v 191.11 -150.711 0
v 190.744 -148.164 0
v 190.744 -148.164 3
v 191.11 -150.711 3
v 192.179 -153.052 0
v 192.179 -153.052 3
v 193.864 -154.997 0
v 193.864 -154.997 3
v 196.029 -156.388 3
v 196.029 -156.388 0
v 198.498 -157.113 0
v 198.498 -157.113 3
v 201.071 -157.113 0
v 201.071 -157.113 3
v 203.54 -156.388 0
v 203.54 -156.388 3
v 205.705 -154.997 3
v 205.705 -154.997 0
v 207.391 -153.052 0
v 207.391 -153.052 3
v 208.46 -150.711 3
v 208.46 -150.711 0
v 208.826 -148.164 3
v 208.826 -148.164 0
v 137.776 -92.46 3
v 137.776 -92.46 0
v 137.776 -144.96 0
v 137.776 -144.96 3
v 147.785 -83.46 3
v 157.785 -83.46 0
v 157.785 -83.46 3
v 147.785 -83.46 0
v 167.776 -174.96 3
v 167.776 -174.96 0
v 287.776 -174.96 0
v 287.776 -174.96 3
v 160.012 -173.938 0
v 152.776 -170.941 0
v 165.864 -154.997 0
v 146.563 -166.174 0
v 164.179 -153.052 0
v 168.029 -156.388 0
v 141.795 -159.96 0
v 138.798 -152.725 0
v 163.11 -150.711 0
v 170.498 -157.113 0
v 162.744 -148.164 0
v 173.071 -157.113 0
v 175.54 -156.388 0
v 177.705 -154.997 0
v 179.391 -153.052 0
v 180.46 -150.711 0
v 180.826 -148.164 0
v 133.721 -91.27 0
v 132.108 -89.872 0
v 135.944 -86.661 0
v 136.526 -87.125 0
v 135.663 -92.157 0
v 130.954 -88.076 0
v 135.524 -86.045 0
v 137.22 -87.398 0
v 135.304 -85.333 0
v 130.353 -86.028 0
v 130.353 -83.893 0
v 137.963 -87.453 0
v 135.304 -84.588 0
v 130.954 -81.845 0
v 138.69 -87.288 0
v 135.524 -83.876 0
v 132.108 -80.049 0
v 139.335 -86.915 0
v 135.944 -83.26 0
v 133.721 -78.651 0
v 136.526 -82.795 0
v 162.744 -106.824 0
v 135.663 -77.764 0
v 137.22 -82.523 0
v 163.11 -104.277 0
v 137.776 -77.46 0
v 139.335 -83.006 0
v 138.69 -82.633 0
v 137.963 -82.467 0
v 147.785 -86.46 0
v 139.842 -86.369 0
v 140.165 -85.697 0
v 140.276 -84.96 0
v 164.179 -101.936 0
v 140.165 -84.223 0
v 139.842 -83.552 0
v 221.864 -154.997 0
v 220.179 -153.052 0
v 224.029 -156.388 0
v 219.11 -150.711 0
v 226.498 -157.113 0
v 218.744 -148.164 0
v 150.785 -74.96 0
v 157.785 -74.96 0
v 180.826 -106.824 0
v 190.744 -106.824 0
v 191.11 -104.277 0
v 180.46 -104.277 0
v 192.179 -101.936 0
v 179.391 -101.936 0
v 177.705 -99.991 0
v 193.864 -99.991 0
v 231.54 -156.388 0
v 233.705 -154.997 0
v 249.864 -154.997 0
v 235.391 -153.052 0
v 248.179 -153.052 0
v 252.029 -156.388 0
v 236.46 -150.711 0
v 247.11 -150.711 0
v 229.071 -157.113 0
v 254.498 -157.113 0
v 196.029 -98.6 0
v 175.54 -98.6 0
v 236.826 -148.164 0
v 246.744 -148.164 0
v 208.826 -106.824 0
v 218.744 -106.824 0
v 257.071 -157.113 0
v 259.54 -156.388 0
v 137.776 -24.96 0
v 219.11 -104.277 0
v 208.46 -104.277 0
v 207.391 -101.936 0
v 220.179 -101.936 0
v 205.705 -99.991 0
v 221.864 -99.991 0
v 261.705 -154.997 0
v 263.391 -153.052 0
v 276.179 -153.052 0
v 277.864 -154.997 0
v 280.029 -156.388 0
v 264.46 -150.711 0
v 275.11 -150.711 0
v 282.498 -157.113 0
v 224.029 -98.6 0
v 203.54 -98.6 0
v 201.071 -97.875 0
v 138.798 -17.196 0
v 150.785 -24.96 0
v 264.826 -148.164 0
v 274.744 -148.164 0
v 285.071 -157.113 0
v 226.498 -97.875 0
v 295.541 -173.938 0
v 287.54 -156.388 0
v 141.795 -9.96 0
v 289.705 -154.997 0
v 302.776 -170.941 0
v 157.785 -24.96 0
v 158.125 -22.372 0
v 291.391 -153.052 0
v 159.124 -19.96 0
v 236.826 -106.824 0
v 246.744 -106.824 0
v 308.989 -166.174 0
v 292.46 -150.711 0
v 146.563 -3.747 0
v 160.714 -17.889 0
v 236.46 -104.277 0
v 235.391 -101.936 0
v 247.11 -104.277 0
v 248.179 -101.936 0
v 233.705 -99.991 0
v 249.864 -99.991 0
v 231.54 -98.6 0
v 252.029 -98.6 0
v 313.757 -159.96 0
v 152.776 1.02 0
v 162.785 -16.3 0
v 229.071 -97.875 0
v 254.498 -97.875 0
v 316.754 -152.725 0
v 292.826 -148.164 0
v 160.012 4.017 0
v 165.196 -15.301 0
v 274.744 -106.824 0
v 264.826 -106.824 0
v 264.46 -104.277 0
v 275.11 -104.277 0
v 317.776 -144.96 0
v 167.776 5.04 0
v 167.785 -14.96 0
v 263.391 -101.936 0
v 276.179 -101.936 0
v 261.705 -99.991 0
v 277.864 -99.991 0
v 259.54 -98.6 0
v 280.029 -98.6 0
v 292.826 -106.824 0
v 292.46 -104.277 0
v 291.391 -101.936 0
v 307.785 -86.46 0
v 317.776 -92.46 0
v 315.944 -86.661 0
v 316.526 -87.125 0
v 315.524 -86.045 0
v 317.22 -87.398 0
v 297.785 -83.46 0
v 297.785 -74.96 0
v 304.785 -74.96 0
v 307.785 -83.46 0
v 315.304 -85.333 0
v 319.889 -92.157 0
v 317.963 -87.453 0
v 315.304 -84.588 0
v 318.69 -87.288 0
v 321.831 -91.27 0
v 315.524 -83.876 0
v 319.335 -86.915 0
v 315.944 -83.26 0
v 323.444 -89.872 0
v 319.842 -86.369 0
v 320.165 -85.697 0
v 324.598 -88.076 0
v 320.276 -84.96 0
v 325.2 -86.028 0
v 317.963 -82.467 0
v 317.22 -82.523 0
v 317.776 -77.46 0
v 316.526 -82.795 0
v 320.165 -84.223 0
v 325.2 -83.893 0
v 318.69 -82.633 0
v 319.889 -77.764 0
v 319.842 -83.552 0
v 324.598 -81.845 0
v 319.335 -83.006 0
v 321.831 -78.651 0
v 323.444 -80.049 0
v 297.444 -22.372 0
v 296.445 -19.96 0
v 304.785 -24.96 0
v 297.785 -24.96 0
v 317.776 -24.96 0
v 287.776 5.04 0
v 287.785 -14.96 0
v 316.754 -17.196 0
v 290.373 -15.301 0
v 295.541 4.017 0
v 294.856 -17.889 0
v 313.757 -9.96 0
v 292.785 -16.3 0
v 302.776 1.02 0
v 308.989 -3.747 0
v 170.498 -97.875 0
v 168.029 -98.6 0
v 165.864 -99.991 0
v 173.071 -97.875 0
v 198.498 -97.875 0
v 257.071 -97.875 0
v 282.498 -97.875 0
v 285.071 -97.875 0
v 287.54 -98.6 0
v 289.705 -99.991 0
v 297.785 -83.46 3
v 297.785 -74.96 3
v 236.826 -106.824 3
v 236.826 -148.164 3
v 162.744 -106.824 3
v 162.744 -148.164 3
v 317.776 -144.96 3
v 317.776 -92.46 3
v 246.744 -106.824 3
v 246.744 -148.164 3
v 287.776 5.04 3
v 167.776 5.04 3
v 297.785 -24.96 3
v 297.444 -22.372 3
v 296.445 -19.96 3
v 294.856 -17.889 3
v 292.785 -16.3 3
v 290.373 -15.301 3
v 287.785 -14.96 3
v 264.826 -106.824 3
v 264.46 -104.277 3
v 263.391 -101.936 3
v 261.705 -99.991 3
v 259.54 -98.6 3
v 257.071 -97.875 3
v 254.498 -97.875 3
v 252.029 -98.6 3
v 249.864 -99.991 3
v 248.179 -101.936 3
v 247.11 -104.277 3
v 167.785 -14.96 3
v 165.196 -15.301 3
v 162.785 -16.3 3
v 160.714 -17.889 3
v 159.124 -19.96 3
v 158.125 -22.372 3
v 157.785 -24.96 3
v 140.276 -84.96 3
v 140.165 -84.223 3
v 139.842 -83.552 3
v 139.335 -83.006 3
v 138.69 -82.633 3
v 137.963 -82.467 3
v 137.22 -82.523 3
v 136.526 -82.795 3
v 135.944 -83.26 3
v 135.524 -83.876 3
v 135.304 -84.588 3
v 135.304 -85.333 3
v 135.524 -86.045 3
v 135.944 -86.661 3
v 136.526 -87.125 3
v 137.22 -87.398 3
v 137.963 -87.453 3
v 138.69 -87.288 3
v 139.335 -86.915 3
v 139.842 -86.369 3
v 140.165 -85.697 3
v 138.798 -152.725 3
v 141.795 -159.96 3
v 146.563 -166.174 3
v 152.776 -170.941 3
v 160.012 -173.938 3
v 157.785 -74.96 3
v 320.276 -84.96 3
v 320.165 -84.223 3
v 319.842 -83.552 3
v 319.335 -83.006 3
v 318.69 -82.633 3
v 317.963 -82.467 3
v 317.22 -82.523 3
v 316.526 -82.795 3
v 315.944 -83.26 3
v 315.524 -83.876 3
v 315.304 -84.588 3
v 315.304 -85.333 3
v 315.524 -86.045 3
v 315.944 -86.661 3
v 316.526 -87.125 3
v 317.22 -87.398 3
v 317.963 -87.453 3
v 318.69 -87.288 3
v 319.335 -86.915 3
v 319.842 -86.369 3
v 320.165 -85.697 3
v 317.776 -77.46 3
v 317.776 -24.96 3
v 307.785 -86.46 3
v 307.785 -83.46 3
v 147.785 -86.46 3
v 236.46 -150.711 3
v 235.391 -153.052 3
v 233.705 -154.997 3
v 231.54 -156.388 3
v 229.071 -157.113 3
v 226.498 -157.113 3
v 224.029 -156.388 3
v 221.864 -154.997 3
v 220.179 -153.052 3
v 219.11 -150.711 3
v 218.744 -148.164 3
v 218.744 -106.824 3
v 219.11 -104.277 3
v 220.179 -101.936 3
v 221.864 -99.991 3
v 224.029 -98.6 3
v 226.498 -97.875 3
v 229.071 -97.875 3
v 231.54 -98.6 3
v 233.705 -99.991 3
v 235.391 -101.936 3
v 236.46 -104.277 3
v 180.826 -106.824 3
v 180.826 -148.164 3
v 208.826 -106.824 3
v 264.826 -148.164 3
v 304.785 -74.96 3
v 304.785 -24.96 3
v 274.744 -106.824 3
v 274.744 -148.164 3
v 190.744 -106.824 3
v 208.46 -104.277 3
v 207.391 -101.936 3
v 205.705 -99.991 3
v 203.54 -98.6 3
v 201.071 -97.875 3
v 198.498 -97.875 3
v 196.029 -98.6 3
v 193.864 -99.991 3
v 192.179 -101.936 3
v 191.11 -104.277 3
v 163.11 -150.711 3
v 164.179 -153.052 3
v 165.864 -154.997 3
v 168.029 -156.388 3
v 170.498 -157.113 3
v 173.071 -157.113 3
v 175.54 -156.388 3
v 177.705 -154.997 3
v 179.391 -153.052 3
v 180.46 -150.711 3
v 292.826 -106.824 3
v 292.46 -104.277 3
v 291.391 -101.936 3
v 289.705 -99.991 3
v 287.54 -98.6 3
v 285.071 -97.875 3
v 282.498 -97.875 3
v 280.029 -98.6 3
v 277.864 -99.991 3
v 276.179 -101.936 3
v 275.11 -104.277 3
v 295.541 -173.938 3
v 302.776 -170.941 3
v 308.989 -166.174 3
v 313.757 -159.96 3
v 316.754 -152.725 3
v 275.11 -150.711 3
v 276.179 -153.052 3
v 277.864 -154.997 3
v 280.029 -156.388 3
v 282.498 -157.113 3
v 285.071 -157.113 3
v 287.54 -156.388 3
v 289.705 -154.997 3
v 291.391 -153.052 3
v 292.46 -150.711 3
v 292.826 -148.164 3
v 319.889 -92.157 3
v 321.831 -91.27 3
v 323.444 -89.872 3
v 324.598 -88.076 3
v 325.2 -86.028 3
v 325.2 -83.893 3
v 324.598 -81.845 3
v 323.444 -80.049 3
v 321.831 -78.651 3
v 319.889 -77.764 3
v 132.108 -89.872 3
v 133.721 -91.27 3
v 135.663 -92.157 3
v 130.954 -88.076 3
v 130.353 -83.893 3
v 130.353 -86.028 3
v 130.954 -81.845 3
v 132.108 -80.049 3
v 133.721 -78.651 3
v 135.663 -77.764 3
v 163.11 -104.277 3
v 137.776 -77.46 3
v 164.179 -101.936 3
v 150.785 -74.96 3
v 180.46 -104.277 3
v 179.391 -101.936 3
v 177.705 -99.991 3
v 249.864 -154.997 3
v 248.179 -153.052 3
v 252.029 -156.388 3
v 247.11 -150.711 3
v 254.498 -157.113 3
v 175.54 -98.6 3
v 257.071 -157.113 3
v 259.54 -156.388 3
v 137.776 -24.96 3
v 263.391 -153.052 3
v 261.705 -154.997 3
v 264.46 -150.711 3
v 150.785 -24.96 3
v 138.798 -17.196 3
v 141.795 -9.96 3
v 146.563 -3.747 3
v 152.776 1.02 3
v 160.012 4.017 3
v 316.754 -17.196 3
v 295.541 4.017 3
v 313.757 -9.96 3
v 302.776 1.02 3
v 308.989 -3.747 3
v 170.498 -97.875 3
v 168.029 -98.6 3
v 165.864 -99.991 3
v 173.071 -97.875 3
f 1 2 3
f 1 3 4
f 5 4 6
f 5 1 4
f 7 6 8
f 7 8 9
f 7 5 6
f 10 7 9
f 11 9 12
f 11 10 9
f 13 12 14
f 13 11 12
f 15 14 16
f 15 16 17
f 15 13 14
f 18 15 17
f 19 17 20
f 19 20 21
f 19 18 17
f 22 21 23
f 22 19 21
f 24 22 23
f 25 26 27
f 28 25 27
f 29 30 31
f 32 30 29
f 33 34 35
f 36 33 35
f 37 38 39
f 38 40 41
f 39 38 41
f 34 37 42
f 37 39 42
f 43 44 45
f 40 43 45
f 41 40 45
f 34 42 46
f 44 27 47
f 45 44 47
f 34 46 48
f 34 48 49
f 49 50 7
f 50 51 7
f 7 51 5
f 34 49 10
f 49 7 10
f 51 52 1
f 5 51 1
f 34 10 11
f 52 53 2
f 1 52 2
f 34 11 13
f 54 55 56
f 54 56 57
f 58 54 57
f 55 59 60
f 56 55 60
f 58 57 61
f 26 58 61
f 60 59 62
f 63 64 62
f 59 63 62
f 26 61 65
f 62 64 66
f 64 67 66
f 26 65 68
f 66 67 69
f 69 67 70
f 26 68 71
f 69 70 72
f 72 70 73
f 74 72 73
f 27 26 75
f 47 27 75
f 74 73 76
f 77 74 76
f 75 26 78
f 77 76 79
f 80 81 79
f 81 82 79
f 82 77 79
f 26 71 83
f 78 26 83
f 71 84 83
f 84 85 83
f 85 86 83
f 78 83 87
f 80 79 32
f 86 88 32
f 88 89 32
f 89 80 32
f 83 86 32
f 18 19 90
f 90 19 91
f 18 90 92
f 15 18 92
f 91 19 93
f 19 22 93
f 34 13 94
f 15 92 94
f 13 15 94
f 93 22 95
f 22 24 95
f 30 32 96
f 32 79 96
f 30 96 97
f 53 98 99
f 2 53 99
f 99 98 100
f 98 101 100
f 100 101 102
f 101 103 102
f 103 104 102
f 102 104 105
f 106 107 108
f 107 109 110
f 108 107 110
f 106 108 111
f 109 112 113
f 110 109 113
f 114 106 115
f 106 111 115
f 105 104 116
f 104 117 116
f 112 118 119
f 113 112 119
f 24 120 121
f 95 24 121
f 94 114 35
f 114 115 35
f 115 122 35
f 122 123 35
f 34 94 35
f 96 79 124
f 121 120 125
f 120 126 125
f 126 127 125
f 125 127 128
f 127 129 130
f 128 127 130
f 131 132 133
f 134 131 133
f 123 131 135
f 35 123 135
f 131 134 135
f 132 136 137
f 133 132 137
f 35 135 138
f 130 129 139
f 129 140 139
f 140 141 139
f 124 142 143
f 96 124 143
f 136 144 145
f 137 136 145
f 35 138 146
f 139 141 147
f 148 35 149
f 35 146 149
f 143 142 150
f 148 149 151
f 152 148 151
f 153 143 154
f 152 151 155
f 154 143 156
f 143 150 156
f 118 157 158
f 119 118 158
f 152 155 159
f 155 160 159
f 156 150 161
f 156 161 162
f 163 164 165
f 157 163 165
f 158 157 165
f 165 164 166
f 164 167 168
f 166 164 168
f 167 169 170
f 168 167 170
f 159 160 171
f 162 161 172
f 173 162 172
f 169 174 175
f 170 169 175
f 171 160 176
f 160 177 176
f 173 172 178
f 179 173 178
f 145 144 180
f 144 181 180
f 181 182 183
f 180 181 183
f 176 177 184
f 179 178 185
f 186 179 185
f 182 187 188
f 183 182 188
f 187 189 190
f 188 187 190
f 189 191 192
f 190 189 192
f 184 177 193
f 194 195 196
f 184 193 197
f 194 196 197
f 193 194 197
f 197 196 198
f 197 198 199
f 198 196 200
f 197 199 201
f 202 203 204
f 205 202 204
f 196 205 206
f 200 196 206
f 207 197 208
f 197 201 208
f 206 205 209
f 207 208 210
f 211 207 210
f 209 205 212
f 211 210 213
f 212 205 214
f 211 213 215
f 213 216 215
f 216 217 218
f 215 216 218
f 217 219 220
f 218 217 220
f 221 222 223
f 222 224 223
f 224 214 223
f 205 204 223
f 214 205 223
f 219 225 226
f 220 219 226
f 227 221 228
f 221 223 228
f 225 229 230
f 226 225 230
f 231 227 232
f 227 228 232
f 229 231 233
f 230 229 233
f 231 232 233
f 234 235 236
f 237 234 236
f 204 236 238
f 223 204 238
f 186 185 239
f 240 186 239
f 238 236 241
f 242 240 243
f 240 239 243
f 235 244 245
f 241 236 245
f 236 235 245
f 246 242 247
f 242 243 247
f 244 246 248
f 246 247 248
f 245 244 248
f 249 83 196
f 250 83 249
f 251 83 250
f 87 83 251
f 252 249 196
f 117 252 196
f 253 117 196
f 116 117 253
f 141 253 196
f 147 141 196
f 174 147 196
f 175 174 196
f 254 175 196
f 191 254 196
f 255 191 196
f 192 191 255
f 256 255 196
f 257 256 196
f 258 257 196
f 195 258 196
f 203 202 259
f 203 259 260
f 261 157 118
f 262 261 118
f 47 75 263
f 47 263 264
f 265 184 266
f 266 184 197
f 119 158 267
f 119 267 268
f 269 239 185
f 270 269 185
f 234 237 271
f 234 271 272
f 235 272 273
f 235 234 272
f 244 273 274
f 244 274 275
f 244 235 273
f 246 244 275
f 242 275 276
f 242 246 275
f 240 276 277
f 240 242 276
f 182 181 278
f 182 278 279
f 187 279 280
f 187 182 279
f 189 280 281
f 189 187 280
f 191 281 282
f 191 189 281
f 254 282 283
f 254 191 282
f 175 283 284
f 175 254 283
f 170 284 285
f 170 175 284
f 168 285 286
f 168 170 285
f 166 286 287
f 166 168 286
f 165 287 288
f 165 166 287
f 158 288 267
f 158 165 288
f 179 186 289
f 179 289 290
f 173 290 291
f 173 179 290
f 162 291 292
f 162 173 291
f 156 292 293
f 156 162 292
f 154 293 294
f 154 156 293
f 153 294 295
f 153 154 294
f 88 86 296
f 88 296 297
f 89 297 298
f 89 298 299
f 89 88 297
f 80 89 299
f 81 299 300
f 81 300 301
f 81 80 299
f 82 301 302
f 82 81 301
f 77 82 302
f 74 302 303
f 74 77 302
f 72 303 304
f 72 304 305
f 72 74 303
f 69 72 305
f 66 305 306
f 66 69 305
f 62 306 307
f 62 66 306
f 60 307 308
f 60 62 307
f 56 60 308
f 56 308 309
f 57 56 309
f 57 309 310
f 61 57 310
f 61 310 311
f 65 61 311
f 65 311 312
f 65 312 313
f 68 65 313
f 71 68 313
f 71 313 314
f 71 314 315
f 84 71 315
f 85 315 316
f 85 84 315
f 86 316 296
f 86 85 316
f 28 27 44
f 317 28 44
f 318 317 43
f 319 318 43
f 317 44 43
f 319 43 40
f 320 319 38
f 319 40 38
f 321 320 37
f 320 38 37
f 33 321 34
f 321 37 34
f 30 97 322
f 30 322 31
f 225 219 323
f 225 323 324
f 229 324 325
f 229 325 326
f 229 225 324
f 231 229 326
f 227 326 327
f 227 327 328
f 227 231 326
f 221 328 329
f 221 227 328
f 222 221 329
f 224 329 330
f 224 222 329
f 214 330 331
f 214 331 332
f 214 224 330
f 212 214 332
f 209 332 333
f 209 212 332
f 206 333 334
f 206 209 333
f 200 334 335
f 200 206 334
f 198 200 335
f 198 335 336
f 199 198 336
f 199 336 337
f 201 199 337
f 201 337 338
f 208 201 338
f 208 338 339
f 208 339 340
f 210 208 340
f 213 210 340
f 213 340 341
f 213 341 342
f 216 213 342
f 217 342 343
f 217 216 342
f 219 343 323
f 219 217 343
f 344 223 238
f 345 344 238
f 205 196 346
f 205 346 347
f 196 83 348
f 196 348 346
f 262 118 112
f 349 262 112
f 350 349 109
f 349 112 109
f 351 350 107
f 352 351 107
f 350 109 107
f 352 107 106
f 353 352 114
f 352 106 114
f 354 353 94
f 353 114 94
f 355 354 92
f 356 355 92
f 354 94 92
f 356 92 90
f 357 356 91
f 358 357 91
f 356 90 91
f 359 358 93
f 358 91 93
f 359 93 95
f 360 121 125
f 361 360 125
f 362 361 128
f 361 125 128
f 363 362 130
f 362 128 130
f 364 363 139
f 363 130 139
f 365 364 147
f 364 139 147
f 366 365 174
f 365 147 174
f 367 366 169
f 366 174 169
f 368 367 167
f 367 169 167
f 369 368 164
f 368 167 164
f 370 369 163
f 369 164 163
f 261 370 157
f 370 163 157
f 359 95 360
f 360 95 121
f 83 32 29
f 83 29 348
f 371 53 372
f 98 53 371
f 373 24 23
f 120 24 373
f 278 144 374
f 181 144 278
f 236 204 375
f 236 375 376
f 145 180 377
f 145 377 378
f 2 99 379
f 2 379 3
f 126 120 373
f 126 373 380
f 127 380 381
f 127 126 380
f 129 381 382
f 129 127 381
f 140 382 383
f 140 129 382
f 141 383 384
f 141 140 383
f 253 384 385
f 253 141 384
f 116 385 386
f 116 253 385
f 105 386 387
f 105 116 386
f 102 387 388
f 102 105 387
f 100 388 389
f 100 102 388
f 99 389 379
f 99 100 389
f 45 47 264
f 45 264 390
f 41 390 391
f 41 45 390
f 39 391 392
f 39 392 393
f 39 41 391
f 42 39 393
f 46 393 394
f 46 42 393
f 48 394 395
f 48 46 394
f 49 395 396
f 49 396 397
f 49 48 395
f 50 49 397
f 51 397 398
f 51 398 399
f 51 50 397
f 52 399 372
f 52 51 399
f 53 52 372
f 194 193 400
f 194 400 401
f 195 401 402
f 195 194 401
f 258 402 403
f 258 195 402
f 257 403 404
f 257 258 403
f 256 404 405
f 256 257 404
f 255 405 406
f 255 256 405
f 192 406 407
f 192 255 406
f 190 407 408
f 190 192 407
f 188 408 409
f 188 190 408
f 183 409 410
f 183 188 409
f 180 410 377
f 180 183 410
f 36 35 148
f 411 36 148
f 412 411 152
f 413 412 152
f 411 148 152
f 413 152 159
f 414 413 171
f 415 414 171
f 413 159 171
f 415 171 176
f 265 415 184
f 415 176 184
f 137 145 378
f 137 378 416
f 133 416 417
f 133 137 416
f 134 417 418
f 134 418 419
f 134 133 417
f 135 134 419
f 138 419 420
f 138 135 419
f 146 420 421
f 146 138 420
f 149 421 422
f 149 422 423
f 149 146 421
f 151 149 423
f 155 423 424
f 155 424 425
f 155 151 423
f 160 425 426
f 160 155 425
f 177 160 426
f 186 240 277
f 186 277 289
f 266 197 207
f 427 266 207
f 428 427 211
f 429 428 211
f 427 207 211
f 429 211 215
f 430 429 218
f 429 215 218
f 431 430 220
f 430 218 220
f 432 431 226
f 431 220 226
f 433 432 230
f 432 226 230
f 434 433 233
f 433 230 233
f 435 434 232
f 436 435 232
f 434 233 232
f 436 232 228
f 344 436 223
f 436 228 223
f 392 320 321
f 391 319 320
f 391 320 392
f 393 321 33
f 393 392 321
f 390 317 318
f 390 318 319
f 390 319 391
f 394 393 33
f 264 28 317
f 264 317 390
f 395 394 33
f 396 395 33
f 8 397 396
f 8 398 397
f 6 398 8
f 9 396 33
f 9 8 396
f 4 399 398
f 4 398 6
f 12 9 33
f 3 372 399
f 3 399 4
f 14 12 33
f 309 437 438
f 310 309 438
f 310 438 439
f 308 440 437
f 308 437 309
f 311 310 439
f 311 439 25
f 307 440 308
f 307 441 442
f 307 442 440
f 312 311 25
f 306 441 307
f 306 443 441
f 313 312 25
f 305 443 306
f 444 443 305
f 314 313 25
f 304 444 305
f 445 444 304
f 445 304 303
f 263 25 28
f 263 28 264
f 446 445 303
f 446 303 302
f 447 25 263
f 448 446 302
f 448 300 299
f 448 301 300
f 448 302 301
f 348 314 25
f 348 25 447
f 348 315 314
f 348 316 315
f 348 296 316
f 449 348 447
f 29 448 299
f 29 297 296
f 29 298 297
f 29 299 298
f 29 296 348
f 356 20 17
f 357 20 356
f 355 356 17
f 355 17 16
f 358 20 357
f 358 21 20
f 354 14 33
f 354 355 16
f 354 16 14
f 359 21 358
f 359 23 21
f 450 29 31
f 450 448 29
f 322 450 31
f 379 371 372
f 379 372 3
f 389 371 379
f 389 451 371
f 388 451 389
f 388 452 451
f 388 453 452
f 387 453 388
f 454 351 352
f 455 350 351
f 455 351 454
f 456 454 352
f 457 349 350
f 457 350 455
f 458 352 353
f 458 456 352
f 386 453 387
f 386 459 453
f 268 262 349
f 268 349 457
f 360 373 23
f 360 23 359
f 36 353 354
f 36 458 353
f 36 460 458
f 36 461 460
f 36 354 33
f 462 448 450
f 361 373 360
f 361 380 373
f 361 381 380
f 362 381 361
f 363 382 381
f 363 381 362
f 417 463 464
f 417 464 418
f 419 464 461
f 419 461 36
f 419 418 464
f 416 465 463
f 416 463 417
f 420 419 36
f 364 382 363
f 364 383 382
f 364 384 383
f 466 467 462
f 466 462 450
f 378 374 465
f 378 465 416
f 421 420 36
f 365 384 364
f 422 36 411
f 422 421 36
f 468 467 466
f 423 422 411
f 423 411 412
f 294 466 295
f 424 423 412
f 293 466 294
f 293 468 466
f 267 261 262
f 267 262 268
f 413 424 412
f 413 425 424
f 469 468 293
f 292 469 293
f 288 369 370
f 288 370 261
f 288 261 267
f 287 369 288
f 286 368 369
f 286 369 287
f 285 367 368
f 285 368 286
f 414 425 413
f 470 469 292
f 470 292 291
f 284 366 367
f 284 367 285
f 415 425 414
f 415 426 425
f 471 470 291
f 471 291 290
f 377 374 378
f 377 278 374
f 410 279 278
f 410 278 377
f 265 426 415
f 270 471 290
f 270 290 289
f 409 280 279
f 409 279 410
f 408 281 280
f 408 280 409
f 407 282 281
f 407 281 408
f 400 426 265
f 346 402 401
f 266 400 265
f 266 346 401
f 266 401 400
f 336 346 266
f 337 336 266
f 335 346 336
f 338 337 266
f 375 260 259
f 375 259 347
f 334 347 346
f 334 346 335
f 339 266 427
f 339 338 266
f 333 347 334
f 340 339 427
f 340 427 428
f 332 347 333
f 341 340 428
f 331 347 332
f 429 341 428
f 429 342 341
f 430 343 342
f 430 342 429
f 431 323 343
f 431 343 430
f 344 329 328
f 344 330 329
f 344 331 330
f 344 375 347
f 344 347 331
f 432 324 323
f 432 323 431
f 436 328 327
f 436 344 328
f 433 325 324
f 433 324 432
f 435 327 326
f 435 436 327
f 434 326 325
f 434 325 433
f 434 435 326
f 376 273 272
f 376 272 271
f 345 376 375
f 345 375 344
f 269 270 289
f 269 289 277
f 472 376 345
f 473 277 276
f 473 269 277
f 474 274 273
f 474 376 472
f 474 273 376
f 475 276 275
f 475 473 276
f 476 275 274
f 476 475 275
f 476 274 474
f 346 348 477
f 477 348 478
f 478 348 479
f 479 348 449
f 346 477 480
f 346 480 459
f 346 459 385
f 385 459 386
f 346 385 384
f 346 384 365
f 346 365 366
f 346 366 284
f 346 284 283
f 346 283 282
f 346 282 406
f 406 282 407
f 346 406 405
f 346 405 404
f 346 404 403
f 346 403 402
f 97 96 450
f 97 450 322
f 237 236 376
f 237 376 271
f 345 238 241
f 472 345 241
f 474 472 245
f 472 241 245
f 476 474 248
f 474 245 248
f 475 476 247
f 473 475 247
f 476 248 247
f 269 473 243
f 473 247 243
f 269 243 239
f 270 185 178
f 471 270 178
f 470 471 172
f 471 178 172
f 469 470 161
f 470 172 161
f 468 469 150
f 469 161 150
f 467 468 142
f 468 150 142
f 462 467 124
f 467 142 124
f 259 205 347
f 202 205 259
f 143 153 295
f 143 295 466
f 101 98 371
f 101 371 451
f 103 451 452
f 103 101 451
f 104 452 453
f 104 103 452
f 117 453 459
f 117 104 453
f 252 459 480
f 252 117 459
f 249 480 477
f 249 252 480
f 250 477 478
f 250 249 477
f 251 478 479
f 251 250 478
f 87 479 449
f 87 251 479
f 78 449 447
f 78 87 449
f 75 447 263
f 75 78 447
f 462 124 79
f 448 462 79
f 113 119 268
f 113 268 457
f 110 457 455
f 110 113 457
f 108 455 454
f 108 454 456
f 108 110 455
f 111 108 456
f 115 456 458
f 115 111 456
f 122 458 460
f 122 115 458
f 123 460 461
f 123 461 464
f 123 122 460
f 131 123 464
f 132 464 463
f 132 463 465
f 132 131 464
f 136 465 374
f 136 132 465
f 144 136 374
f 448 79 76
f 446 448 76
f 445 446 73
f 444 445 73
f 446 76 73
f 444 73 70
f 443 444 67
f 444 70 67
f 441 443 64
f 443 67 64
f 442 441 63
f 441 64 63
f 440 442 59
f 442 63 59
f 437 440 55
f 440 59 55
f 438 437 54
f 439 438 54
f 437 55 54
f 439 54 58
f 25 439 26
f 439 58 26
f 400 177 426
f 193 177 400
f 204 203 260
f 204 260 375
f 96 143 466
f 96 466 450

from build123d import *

# Parameters (mm, degrees)
SKETCH1_R           = 2.5
BOSS_EXTRUDE1_DEPTH = 3


with BuildPart() as part:
    # Sketch1 → Boss-Extrude1 (new body)
    with BuildSketch(Plane.XY):
        with BuildLine():
            Line((167.77621964, -174.96032759), (287.77621964, -174.96032759))
            ThreePointArc((287.77621964, -174.96032759), (308.989423075, -166.173531026), (317.77621964, -144.96032759))
            Line((317.77621964, -144.96032759), (317.77621964, -92.46032759))
            ThreePointArc((317.77621964, -92.46032759), (325.27621964, -84.96032759), (317.77621964, -77.46032759))
            Line((317.77621964, -77.46032759), (317.77621964, -24.96032759))
            ThreePointArc((317.77621964, -24.96032759), (308.989423075, -3.747124154), (287.77621964, 5.03967241))
            Line((287.77621964, 5.03967241), (167.77621964, 5.03967241))
            ThreePointArc((167.77621964, 5.03967241), (146.563016204, -3.747124154), (137.77621964, -24.96032759))
            Line((137.77621964, -24.96032759), (137.77621964, -77.46032759))
            ThreePointArc((137.77621964, -77.46032759), (130.27621964, -84.96032759), (137.77621964, -92.46032759))
            Line((137.77621964, -92.46032759), (137.77621964, -144.96032759))
            ThreePointArc((137.77621964, -144.96032759), (146.563016204, -166.173531026), (167.77621964, -174.96032759))
        make_face()
        with Locations((317.77621964, -84.96032759)):
            Circle(SKETCH1_R, mode=Mode.SUBTRACT)
        with Locations((137.77621964, -84.96032759)):
            Circle(SKETCH1_R, mode=Mode.SUBTRACT)
        with BuildLine():
            Line((226.284678956, -14.96032759), (167.784678956, -14.96032759))
            ThreePointArc((167.784678956, -14.96032759), (160.713611144, -17.889259778), (157.784678956, -24.96032759))
            Line((157.784678956, -24.96032759), (150.784678956, -24.96032759))
            Line((150.784678956, -24.96032759), (150.784678956, -74.96032759))
            Line((150.784678956, -74.96032759), (157.784678956, -74.96032759))
            Line((157.784678956, -74.96032759), (157.784678956, -83.46032759))
            Line((157.784678956, -83.46032759), (147.784678956, -83.46032759))
            Line((147.784678956, -83.46032759), (147.784678956, -86.46032759))
            Line((147.784678956, -86.46032759), (157.784678956, -86.46032759))
            Line((157.784678956, -86.46032759), (297.784678956, -86.46032759))
            Line((297.784678956, -86.46032759), (307.784678956, -86.46032759))
            Line((307.784678956, -86.46032759), (307.784678956, -83.46032759))
            Line((307.784678956, -83.46032759), (297.784678956, -83.46032759))
            Line((297.784678956, -83.46032759), (297.784678956, -74.96032759))
            Line((297.784678956, -74.96032759), (304.784678956, -74.96032759))
            Line((304.784678956, -74.96032759), (304.784678956, -24.96032759))
            Line((304.784678956, -24.96032759), (297.784678956, -24.96032759))
            ThreePointArc((297.784678956, -24.96032759), (294.855746768, -17.889259778), (287.784678956, -14.96032759))
            Line((287.784678956, -14.96032759), (229.284678956, -14.96032759))
            Line((229.284678956, -14.96032759), (226.284678956, -14.96032759))
        make_face(mode=Mode.SUBTRACT)
        with BuildLine():
            Line((246.743573739, -106.823862957), (246.743573739, -148.163900951))
            ThreePointArc((246.743573739, -148.163900951), (255.784678956, -157.205006168), (264.825784173, -148.163900951))
            Line((264.825784173, -148.163900951), (264.825784173, -106.823862957))
            ThreePointArc((264.825784173, -106.823862957), (255.784678956, -97.78275774), (246.743573739, -106.823862957))
        make_face(mode=Mode.SUBTRACT)
        with BuildLine():
            Line((236.825784173, -106.823862957), (236.825784173, -148.163900951))
            ThreePointArc((236.825784173, -148.163900951), (227.784678956, -157.205006168), (218.743573739, -148.163900951))
            Line((218.743573739, -148.163900951), (218.743573739, -106.823862957))
            ThreePointArc((218.743573739, -106.823862957), (227.784678956, -97.78275774), (236.825784173, -106.823862957))
        make_face(mode=Mode.SUBTRACT)
        with BuildLine():
            Line((274.743573739, -106.823862957), (274.743573739, -148.163900951))
            ThreePointArc((274.743573739, -148.163900951), (283.784678956, -157.205006168), (292.825784173, -148.163900951))
            Line((292.825784173, -148.163900951), (292.825784173, -106.823862957))
            ThreePointArc((292.825784173, -106.823862957), (283.784678956, -97.78275774), (274.743573739, -106.823862957))
        make_face(mode=Mode.SUBTRACT)
        with BuildLine():
            Line((190.743573739, -106.823862957), (190.743573739, -148.163900951))
            ThreePointArc((190.743573739, -148.163900951), (199.784678956, -157.205006168), (208.825784173, -148.163900951))
            Line((208.825784173, -148.163900951), (208.825784173, -106.823862957))
            ThreePointArc((208.825784173, -106.823862957), (199.784678956, -97.78275774), (190.743573739, -106.823862957))
        make_face(mode=Mode.SUBTRACT)
        with BuildLine():
            Line((162.743573739, -106.823862957), (162.743573739, -148.163900951))
            ThreePointArc((162.743573739, -148.163900951), (171.784678956, -157.205006168), (180.825784173, -148.163900951))
            Line((180.825784173, -148.163900951), (180.825784173, -106.823862957))
            ThreePointArc((180.825784173, -106.823862957), (171.784678956, -97.78275774), (162.743573739, -106.823862957))
        make_face(mode=Mode.SUBTRACT)
    extrude(amount=BOSS_EXTRUDE1_DEPTH)


solid = part.part
